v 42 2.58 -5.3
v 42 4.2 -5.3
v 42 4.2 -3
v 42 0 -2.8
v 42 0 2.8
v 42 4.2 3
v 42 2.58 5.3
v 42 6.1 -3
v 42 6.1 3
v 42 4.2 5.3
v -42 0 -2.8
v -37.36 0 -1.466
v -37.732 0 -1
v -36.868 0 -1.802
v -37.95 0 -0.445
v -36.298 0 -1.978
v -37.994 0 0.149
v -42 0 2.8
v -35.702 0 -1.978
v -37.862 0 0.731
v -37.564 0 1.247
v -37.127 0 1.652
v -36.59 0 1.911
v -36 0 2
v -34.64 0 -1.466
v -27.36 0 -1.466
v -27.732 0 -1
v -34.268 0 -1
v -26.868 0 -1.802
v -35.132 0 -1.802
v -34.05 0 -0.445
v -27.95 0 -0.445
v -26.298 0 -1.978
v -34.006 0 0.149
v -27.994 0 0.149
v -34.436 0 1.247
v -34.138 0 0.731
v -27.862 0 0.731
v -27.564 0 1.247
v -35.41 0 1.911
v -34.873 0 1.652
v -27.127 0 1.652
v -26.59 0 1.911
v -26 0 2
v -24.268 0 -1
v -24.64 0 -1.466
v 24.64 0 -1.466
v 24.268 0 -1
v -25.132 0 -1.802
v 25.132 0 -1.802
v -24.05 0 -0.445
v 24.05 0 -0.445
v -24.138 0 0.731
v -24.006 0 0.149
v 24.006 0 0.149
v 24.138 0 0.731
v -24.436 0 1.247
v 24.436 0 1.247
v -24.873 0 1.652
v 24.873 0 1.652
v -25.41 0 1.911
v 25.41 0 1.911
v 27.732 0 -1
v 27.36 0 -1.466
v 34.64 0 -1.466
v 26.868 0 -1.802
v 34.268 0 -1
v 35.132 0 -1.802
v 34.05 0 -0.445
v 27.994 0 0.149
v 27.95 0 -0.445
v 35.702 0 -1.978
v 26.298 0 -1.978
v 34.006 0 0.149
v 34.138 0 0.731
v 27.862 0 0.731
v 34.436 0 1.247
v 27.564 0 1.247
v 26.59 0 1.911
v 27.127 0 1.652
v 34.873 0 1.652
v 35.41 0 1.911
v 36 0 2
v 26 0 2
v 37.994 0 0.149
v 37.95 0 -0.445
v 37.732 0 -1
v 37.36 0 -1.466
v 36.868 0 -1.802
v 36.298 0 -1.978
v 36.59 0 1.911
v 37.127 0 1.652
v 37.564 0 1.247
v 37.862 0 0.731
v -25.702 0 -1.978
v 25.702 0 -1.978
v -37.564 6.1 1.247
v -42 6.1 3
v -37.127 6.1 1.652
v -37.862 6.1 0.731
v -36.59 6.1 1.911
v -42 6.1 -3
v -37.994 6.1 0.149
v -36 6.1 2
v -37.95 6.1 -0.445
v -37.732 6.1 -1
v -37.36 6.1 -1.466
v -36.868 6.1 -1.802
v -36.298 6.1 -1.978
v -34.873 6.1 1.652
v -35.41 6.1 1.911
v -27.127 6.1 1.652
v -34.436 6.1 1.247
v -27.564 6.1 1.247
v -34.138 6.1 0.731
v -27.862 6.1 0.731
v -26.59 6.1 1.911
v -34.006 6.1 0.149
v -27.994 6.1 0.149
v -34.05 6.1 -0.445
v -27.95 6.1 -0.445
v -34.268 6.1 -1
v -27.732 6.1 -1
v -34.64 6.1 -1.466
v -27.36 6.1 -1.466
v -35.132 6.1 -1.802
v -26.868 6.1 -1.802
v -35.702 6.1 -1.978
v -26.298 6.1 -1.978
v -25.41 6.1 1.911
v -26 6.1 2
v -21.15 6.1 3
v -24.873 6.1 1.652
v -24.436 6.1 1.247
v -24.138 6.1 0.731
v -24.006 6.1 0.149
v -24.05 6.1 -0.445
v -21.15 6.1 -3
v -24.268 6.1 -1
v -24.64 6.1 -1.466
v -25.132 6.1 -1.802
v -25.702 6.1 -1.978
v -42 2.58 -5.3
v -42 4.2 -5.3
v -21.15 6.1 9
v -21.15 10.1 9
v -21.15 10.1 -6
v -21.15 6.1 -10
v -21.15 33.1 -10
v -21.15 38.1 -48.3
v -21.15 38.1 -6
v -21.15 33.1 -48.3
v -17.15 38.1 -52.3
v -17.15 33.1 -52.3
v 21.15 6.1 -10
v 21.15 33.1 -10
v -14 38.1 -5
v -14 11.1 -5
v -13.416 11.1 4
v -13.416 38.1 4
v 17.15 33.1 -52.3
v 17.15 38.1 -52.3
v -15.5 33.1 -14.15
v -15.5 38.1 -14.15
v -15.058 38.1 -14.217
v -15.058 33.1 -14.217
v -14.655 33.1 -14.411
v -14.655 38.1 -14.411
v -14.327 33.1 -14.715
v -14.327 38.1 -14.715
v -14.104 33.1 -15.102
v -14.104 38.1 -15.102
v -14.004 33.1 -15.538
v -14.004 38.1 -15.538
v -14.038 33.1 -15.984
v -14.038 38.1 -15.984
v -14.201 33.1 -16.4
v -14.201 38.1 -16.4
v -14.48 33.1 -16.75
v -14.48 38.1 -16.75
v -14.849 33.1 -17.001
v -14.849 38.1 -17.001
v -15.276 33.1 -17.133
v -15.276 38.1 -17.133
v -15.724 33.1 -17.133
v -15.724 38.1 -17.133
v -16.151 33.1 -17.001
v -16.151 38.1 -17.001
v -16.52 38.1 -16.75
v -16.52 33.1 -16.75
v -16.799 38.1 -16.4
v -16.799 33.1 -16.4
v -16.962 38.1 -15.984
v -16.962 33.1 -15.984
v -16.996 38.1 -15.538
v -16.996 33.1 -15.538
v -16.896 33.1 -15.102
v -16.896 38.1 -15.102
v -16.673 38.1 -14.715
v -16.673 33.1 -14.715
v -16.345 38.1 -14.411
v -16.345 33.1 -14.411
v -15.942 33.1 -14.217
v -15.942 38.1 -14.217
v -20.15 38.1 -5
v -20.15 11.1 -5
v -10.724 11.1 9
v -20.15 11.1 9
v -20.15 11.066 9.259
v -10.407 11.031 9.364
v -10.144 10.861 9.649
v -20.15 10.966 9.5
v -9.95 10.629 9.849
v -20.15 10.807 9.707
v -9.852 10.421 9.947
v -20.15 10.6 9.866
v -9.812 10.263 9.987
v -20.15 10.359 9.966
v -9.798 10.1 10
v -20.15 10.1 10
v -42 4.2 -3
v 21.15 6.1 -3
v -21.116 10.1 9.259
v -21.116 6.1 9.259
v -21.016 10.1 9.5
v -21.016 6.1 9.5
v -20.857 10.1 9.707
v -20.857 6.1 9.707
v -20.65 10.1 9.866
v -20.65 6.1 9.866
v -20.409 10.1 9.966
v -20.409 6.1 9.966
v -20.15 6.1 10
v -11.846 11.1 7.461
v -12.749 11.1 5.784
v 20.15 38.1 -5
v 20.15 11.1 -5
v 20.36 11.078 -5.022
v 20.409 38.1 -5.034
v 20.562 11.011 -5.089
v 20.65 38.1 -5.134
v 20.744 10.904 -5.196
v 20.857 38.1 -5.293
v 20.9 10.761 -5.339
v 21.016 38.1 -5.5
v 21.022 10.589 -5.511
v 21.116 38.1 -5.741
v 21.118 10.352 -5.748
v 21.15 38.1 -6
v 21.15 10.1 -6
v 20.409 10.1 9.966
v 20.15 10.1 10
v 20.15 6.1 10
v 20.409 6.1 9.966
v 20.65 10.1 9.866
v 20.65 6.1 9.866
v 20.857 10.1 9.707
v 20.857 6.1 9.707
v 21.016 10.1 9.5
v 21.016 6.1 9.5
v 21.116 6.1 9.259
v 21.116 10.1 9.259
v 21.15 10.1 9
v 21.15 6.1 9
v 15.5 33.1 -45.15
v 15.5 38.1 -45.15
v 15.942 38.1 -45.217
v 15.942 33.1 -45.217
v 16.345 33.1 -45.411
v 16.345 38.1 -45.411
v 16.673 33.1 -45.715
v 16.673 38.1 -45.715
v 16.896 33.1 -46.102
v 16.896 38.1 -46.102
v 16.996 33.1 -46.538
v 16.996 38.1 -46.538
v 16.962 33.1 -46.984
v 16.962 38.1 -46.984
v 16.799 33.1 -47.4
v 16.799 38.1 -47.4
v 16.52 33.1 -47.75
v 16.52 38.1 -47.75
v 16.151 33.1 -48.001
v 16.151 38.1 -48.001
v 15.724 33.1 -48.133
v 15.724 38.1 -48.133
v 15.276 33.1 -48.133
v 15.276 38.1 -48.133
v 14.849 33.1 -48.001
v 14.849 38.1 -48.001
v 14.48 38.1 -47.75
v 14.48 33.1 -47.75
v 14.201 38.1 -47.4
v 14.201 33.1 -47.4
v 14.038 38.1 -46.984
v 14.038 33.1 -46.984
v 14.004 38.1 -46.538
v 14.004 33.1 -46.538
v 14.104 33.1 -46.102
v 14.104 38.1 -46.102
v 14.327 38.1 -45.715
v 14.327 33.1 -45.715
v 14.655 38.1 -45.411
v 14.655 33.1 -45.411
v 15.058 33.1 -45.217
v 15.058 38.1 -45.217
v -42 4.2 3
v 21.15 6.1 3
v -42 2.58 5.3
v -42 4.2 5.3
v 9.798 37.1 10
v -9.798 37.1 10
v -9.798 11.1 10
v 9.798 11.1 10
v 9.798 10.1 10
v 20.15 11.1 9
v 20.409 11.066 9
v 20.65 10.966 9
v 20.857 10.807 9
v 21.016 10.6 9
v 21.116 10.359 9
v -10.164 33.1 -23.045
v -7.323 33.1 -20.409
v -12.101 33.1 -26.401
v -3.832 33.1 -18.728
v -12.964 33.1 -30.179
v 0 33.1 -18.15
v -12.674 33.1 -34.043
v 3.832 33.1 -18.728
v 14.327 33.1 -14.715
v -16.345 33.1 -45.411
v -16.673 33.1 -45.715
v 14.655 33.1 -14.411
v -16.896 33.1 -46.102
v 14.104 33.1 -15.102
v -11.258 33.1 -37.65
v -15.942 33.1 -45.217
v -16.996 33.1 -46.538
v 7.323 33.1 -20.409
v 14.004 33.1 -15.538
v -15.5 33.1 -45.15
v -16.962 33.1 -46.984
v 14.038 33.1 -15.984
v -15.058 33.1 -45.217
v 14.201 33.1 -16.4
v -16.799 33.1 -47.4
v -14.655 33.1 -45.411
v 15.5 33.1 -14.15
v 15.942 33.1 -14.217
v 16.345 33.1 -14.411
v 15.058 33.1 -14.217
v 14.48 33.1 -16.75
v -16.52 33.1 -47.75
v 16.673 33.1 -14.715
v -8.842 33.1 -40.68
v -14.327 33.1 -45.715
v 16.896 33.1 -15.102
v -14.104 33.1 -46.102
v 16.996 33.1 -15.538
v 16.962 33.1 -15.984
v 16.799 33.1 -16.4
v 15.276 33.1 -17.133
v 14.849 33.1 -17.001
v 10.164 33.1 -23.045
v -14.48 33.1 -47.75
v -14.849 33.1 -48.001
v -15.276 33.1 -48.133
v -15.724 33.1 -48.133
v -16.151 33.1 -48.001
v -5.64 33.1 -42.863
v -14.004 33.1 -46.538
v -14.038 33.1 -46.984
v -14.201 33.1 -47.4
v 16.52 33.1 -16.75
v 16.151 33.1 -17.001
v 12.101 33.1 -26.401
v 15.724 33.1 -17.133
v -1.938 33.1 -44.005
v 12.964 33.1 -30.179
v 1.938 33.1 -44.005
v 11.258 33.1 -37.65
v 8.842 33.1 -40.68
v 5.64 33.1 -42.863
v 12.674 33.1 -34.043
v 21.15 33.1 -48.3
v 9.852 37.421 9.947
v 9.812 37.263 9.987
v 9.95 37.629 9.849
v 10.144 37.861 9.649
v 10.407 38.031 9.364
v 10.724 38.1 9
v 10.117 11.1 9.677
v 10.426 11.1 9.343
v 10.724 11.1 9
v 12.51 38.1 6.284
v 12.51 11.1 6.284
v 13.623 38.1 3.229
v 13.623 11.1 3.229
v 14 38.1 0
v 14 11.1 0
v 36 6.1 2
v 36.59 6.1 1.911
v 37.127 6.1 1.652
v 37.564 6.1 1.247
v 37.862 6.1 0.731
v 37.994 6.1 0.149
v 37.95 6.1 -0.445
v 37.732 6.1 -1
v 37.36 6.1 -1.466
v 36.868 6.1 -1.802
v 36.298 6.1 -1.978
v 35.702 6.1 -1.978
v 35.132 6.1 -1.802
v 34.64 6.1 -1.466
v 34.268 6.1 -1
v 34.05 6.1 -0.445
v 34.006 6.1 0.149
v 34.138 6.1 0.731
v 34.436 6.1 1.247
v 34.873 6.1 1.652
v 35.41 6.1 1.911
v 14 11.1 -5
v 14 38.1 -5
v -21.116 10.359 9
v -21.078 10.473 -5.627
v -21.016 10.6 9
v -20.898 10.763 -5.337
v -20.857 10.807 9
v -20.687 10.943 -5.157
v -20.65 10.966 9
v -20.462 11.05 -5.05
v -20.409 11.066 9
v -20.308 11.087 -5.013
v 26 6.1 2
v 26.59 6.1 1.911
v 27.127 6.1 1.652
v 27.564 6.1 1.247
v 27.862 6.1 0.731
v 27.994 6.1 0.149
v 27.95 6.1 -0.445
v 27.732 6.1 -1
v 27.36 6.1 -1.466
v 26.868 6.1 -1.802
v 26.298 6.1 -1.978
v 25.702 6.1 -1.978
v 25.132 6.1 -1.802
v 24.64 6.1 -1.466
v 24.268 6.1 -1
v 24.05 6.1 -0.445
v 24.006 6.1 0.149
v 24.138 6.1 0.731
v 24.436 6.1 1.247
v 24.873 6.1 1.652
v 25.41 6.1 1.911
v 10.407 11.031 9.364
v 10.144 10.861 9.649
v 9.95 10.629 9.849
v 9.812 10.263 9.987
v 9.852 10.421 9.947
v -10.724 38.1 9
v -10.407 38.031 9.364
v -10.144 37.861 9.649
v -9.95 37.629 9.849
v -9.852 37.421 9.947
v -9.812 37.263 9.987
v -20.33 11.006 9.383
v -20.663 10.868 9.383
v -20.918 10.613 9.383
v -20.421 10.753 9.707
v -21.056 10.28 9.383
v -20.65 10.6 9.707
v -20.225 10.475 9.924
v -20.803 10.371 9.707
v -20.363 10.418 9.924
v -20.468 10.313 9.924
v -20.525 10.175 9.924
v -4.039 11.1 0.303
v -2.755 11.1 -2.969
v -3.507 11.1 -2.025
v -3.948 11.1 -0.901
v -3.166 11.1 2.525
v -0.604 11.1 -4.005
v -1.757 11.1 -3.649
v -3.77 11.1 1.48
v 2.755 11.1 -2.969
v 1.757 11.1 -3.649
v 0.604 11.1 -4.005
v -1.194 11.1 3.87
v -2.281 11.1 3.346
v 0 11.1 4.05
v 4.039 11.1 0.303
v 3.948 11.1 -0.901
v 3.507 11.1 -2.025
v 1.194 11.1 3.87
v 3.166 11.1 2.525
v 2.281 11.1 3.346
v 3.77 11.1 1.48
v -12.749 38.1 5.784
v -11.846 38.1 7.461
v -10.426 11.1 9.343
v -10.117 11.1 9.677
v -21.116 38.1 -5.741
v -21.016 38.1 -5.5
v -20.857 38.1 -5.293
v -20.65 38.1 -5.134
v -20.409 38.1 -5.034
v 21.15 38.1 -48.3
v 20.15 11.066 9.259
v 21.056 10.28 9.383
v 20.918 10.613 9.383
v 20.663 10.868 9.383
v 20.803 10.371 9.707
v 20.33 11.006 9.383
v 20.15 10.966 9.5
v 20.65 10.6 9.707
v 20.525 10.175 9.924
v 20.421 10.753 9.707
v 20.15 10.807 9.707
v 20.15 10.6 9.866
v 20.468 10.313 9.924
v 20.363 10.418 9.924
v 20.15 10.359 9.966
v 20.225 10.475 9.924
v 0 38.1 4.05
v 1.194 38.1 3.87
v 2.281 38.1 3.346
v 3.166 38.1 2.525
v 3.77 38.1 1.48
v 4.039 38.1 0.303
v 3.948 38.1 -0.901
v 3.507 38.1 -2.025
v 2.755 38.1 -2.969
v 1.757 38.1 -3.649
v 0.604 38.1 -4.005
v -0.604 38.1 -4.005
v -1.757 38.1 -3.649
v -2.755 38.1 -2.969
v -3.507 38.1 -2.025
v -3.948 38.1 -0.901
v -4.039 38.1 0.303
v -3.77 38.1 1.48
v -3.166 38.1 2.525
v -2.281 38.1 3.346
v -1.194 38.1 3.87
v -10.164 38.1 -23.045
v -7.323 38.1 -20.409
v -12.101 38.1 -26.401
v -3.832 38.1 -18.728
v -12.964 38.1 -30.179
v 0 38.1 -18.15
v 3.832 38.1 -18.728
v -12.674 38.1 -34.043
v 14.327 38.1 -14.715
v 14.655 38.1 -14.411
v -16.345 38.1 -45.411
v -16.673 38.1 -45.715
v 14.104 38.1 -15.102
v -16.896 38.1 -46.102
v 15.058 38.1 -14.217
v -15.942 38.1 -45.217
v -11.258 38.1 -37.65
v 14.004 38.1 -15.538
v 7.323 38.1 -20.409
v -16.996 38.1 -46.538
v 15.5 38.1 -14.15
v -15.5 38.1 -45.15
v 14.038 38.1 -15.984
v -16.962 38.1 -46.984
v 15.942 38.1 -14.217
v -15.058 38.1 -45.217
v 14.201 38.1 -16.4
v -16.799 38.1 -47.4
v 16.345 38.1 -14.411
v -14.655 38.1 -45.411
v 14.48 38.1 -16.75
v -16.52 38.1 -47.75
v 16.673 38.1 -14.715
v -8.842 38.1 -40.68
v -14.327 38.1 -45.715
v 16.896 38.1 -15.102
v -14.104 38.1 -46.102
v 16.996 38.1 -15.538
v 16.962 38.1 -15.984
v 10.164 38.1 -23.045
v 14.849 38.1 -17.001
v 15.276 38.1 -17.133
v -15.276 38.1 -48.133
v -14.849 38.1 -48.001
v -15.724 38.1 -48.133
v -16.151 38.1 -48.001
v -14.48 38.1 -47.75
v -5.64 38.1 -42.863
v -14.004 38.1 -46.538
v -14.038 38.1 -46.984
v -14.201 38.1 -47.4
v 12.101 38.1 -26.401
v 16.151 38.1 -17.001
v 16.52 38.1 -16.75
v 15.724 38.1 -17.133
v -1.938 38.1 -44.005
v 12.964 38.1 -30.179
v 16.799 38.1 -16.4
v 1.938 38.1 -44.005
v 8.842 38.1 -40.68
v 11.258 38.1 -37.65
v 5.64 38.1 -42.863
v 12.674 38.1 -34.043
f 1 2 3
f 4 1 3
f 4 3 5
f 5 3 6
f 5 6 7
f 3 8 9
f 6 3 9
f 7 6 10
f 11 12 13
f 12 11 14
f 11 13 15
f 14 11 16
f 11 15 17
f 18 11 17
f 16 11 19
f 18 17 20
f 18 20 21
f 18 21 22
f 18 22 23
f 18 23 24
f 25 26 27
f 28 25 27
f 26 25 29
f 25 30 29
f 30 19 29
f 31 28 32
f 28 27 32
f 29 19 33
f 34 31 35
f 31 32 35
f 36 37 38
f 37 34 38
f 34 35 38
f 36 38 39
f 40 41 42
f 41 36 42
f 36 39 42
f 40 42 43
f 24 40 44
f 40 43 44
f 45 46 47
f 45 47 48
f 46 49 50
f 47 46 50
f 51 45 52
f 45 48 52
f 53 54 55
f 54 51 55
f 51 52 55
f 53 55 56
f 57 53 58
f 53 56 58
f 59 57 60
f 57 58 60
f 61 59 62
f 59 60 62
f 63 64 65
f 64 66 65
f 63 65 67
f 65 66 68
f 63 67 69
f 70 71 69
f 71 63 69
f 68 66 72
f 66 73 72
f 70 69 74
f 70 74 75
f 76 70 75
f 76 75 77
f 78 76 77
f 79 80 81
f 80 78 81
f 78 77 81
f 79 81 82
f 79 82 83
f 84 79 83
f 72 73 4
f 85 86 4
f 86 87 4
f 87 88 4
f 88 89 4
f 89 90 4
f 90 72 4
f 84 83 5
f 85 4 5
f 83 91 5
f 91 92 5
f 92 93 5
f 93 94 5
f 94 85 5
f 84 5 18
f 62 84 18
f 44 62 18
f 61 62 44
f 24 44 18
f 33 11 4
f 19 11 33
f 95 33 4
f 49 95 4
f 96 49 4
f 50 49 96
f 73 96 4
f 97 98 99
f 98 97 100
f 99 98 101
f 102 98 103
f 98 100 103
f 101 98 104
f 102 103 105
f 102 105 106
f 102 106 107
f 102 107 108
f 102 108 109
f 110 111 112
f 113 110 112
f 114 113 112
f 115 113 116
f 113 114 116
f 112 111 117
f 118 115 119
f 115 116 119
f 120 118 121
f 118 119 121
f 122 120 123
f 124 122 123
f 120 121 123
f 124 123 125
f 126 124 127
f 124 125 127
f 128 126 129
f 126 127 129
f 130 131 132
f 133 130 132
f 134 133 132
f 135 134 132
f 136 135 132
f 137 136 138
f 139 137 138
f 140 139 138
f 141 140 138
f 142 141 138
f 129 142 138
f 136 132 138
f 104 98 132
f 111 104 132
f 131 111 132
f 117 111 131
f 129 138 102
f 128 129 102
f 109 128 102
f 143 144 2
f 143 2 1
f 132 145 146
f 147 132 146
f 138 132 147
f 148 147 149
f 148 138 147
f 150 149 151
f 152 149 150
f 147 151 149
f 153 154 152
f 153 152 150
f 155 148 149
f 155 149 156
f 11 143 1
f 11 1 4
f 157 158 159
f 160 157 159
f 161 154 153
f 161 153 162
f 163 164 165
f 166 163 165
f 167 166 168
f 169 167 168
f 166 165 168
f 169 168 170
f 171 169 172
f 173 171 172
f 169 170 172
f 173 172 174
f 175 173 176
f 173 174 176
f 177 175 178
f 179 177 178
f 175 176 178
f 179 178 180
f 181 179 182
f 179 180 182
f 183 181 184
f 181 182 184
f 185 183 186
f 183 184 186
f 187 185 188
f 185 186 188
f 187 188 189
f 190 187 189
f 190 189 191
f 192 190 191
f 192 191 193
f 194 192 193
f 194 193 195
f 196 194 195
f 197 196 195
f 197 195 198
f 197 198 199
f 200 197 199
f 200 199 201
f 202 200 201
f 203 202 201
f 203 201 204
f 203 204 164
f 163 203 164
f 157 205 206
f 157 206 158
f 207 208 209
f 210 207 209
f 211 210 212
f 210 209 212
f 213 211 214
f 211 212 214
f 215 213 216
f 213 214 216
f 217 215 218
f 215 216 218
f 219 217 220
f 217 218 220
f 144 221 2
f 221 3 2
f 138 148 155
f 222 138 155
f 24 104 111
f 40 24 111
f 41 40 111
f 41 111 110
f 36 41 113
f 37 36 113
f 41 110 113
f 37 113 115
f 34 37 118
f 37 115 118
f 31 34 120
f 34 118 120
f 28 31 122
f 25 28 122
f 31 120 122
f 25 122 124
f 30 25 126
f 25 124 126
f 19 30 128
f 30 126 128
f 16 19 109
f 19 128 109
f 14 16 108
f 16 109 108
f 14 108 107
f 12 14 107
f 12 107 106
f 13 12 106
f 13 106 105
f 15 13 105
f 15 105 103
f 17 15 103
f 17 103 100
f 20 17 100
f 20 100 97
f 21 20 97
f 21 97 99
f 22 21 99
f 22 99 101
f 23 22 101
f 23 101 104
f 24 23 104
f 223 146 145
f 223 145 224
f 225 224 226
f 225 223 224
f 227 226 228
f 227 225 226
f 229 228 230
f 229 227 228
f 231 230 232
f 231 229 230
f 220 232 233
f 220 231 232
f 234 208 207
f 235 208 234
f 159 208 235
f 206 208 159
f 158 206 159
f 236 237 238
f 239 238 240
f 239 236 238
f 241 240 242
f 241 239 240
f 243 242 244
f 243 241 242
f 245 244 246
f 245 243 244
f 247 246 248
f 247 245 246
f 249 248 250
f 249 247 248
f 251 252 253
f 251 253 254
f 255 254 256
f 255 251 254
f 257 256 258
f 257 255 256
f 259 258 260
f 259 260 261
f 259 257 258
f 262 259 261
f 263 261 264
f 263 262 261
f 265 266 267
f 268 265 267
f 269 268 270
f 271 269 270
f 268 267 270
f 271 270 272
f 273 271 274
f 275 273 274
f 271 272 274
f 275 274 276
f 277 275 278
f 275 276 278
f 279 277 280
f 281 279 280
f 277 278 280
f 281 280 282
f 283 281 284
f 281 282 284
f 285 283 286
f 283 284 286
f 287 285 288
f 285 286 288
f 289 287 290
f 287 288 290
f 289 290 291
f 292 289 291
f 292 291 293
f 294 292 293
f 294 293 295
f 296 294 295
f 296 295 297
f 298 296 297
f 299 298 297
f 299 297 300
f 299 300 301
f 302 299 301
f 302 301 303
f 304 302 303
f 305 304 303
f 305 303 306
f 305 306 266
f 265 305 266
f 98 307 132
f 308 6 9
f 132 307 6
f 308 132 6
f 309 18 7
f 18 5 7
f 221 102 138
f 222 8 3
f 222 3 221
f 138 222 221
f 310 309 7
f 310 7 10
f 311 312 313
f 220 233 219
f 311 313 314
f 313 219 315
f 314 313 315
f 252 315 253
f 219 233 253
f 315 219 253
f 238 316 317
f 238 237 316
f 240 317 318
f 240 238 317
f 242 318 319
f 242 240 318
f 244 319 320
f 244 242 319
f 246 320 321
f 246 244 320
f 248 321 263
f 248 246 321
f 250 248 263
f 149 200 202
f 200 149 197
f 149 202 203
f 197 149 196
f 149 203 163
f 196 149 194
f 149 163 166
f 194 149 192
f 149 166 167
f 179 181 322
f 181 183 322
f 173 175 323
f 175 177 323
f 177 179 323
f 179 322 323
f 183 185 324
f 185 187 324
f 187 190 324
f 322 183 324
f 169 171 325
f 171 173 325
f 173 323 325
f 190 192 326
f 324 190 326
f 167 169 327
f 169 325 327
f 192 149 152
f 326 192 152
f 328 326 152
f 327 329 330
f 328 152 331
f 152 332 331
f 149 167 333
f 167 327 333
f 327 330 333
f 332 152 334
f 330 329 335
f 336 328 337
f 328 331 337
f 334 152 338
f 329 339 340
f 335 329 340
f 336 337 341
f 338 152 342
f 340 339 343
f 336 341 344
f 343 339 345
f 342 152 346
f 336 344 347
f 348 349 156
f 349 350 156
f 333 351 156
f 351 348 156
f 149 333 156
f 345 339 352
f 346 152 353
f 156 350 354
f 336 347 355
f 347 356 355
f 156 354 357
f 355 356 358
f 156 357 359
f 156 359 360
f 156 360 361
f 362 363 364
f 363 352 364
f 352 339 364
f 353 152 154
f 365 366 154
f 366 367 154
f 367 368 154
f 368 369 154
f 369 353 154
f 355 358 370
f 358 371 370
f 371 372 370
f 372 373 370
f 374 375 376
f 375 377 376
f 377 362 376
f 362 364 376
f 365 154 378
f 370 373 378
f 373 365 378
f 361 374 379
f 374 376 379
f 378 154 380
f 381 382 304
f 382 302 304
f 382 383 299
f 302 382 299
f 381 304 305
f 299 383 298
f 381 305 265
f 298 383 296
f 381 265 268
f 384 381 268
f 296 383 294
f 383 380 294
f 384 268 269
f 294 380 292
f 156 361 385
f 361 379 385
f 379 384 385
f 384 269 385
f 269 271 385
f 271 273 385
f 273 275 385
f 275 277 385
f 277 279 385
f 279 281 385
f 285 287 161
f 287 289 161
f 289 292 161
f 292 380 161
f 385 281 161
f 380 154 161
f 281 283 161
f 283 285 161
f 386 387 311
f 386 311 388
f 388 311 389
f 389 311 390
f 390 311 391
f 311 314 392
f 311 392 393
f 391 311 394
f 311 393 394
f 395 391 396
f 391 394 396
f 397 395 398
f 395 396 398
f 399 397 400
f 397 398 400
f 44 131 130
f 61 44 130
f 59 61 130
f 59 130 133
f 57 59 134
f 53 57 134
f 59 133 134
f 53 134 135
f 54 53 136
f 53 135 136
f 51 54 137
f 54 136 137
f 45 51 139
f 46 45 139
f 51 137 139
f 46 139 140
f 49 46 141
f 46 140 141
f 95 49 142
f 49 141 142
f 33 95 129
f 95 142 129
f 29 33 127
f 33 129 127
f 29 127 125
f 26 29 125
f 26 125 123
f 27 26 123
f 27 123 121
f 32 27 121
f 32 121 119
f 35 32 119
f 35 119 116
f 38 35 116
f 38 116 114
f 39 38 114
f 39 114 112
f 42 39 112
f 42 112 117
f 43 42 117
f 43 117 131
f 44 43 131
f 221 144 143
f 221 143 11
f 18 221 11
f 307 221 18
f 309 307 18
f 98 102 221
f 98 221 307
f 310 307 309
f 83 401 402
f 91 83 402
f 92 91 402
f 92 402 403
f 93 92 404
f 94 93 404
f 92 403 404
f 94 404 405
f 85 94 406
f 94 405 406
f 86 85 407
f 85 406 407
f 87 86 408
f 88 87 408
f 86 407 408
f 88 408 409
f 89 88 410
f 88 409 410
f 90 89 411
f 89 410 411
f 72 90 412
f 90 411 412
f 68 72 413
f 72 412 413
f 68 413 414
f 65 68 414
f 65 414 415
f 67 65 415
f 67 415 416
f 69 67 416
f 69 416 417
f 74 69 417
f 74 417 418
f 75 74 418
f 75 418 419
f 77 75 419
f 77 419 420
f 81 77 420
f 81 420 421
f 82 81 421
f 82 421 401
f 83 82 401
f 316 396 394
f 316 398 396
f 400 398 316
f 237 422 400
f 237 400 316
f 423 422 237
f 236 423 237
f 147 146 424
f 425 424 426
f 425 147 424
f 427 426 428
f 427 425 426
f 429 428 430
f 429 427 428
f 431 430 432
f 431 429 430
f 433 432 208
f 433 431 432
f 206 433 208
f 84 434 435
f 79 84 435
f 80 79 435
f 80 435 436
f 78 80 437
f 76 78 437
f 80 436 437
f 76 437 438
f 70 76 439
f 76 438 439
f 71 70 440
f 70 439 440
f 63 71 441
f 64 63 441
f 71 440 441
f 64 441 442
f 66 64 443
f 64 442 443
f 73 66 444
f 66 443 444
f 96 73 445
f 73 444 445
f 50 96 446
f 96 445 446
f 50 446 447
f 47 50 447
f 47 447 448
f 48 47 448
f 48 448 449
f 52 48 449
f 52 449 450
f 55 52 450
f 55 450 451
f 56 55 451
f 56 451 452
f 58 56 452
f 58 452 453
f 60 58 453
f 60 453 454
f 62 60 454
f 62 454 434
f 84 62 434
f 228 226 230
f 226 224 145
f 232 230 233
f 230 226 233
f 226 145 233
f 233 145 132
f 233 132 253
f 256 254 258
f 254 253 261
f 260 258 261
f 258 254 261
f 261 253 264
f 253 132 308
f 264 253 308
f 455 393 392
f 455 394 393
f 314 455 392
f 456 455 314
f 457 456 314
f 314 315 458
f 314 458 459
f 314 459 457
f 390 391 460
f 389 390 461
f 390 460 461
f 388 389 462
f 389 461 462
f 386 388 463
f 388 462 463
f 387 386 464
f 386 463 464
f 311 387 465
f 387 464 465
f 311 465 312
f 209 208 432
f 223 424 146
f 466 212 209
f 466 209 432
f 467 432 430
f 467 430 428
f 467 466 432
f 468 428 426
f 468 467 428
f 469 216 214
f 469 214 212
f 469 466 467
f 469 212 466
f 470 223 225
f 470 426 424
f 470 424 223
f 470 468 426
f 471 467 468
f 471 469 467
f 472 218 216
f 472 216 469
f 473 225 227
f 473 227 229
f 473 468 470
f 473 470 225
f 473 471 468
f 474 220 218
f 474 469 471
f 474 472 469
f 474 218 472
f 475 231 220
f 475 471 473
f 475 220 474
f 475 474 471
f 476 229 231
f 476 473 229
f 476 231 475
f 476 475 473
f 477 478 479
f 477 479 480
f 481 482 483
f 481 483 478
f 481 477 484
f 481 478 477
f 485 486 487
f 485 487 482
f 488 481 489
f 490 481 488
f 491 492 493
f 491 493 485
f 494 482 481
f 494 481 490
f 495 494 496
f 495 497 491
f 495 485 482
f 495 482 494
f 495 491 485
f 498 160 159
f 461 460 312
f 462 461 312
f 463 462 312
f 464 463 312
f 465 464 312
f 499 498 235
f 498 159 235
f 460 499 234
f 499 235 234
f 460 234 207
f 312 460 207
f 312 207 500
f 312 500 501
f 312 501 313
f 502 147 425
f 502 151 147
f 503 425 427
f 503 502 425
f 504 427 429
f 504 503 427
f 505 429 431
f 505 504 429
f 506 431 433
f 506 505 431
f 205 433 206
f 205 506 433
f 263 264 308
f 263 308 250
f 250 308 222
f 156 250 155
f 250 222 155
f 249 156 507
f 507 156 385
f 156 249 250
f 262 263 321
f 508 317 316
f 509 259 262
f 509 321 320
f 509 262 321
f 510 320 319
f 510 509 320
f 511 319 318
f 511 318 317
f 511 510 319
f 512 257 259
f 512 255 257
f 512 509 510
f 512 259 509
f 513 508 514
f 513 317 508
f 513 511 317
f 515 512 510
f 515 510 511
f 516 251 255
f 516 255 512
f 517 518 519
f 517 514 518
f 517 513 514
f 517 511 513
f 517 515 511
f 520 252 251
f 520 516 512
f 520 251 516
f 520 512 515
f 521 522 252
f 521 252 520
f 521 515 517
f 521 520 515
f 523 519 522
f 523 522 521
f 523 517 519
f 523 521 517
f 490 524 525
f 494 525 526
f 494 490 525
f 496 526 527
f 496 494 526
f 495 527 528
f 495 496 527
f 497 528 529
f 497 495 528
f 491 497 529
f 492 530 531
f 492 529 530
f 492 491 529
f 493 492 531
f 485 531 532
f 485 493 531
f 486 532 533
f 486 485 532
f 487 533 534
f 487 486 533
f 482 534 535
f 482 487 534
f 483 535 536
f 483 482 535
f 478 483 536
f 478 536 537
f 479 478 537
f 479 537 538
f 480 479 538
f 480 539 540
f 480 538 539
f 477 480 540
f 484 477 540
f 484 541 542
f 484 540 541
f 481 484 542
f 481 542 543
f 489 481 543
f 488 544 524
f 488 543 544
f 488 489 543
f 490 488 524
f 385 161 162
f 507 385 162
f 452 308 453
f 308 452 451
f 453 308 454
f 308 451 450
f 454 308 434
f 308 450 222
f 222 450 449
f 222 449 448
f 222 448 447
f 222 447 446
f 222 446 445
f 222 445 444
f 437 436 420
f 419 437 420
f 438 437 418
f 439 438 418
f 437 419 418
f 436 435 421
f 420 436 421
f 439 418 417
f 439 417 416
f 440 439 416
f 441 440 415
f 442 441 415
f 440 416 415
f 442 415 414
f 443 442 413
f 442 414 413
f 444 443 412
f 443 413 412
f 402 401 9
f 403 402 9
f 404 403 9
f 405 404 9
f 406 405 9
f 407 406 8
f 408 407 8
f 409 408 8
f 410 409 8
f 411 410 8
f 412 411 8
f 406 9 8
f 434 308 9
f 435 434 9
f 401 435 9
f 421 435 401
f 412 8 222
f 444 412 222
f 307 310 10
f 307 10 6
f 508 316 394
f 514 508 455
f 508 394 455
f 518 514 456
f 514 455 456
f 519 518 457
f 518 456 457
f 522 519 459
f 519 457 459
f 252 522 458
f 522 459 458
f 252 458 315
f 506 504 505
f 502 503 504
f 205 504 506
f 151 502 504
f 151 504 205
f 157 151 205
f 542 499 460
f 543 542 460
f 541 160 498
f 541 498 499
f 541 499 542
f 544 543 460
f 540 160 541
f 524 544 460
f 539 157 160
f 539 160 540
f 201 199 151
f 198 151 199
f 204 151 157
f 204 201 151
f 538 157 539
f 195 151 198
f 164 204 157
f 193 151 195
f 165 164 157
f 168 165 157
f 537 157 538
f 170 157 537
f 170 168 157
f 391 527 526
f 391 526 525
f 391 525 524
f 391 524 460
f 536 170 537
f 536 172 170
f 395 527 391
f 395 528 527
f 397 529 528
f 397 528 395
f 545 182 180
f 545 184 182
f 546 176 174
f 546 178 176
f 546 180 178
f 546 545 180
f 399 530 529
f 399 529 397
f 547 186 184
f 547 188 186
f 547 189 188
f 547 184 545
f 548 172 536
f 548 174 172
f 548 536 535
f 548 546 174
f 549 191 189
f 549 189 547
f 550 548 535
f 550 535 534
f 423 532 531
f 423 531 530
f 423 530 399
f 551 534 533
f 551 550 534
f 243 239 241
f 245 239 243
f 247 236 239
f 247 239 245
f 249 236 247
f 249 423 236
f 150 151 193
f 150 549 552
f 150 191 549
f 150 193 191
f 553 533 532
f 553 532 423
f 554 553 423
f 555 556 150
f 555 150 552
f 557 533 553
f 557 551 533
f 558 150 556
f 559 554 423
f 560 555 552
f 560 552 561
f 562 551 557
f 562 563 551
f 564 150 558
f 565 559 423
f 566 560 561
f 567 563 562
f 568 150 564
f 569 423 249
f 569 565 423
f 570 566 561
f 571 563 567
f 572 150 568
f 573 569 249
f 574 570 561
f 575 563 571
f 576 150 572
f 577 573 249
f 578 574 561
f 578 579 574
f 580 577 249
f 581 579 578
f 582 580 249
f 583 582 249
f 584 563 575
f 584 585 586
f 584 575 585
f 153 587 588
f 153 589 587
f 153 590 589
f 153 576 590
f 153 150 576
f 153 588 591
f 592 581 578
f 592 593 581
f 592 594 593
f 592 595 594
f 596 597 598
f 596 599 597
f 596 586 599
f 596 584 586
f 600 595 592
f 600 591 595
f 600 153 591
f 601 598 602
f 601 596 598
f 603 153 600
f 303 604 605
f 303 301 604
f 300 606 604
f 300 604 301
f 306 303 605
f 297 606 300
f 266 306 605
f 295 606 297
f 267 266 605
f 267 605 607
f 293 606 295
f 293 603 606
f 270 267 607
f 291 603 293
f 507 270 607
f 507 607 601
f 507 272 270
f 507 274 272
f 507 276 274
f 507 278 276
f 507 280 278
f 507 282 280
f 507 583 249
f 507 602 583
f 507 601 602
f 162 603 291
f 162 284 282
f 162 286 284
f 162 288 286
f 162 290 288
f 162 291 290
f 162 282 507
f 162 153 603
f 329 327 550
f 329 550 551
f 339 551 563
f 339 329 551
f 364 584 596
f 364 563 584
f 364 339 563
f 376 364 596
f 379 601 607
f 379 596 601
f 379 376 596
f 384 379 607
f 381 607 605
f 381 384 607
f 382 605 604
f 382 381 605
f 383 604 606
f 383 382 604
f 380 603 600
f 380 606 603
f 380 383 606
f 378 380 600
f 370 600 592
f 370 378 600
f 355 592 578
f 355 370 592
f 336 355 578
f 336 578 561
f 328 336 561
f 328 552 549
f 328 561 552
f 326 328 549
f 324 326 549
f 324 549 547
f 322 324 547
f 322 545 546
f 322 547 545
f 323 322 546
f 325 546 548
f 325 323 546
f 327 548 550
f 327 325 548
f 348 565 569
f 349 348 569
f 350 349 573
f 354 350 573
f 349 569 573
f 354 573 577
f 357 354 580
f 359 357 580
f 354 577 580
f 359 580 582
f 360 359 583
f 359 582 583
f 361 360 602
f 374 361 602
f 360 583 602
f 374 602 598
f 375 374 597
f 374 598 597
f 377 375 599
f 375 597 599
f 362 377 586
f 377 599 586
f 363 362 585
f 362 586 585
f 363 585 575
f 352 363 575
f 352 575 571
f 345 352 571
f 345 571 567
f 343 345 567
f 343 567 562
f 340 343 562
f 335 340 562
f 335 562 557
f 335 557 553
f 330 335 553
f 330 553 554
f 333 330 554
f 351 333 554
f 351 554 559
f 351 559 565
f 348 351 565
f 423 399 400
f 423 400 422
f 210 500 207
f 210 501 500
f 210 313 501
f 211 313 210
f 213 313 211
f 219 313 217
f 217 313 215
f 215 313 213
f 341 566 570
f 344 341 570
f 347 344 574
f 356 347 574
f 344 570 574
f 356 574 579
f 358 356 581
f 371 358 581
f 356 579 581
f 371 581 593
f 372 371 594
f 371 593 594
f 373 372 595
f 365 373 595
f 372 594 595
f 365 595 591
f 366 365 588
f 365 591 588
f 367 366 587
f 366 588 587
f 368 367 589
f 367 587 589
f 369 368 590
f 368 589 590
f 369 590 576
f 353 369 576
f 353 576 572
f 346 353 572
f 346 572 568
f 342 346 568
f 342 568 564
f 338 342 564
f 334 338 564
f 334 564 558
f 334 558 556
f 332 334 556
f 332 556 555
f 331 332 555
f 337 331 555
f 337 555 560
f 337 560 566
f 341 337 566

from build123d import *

# Parameters (mm, degrees)
BOSS_EXTRUDE1_DEPTH     = 42
SKETCH2_W               = 42.3
SKETCH2_H               = 20
BOSS_EXTRUDE2_DEPTH     = 32
SKETCH3_W               = 42.3
SKETCH3_H               = 42.3
BOSS_EXTRUDE3_DEPTH     = 5
SHELL2_START            = 11.1
SHELL2_OUTLINE_W        = 42.3
SHELL2_OUTLINE_H        = 15
SHELL2_DEPTH            = 27
CHAMFER2_SIZE           = 4
CUT_EXTRUDE1_DEPTH      = 75.799064165
CUT_EXTRUDE1_DEPTH_BACK = 75.799064165
SKETCH4_R               = 13
FILLET1_R               = 1
BOSS_EXTRUDE4_DEPTH     = 27
SKETCH18_R              = 4.05
CUT_EXTRUDE2_DEPTH      = 73.306915299
FILLET8_R               = 1
SKETCH19_R              = 1.5
CUT_EXTRUDE3_DEPTH      = 78.142076716
SKETCH20_R              = 2
CUT_EXTRUDE4_DEPTH      = 75.318840185


# Read off the part's stored shape, not the designer's step: Shell2
with BuildPart() as part:
    # Sketch1 → Boss-Extrude1 (new, symmetric)
    with BuildSketch(Plane(origin=(0, 0, 0), x_dir=(0, 0, -1), z_dir=(1, 0, 0))):
        Polygon((-3, 6.1), (3, 6.1), (3, 4.2), (5.3, 4.2), (5.3, 2.58), (2.8, 0), (-2.8, 0), (-5.3, 2.58), (-5.3, 4.2), (-3, 4.2), align=None)
    extrude(amount=BOSS_EXTRUDE1_DEPTH, both=True)

    # Sketch2 → Boss-Extrude2 (add)
    with BuildSketch(Plane(origin=(0, 6.1, 0), x_dir=(1, 0, 0), z_dir=(0, 1, 0))):
        Rectangle(SKETCH2_W, SKETCH2_H)
    extrude(amount=BOSS_EXTRUDE2_DEPTH)

    # Sketch3 → Boss-Extrude3 (add)
    with BuildSketch(Plane(origin=(0, 33.1, 0), x_dir=(1, 0, 0), z_dir=(0, 1, 0))):
        with Locations((0, 31.15)):
            Rectangle(SKETCH3_W, SKETCH3_H)
    extrude(amount=BOSS_EXTRUDE3_DEPTH)

    # Shell2 outline → Shell2 (cut)
    with BuildSketch(Plane(origin=(0, 0, 0), x_dir=(1, 0, 0), z_dir=(0, 1, 0)).offset(SHELL2_START)):
        with Locations((0, -2.5)):
            Rectangle(SHELL2_OUTLINE_W, SHELL2_OUTLINE_H)
    extrude(amount=SHELL2_DEPTH, mode=Mode.SUBTRACT)

    # Chamfer2
    chamfer2_edges = [part.edges().sort_by_distance(p)[0] for p in [
        (21.15, 35.6, -52.3),
        (-21.15, 35.6, -52.3),
    ]]
    chamfer(chamfer2_edges, length=CHAMFER2_SIZE)

    # Sketch4 → Cut-Extrude1 (cut, two sides: drawn at the far end of the back side and taken through both)
    with BuildSketch(Plane(origin=(0, 33.1, 0), x_dir=(1, 0, 0), z_dir=(0, 1, 0)).offset(-CUT_EXTRUDE1_DEPTH_BACK)):
        with Locations(Location((0, 31.15, 0), (0, 0, 270))):
            Circle(SKETCH4_R)
    extrude(amount=CUT_EXTRUDE1_DEPTH + CUT_EXTRUDE1_DEPTH_BACK, mode=Mode.SUBTRACT)

    # Fillet1
    fillet1_edges = [part.edges().sort_by_distance(p)[0] for p in [
        (-21.15, 8.6, 10),
        (21.15, 8.6, 10),
        (-21.15, 11.1, 2.5),
        (-21.15, 24.6, -5),
        (21.15, 11.1, 2.5),
        (21.15, 24.6, -5),
    ]]
    fillet(fillet1_edges, radius=FILLET1_R)

    # Sketch17 → Boss-Extrude4 (add)
    with BuildSketch(Plane(origin=(0, 11.1, 0), x_dir=(1, 0, 0), z_dir=(0, 1, 0))):
        with BuildLine():
            Line((14, 5), (-14, 5))
            Line((-14, 5), (-13.416407865, -4))
            ThreePointArc((-13.416407865, -4), (-11.98860738, -7.230027185), (-9.797958971, -10))
            Line((-9.797958971, -10), (9.797958971, -10))
            ThreePointArc((9.797958971, -10), (12.906808777, -5.423494003), (14, 0))
            Line((14, 0), (14, 5))
        make_face()
    extrude(amount=BOSS_EXTRUDE4_DEPTH)

    # Sketch18 → Cut-Extrude2 (cut, through all)
    with BuildSketch(Plane(origin=(0, 11.1, 0), x_dir=(1, 0, 0), z_dir=(0, 1, 0))):
        with Locations(Location((0, 0, 0), (0, 0, 270))):
            Circle(SKETCH18_R)
    extrude(amount=CUT_EXTRUDE2_DEPTH, mode=Mode.SUBTRACT)

    # Fillet8
    # the kernel refuses this fillet: 1 mm, written as the material it takes off along each edge
    with BuildSketch(Plane(origin=(-20.15, 10.1, 9), x_dir=(0, 1, 0), z_dir=(0, 0, 1))) as fillet8_piece_1_section:
        Polygon((0, 0), (FILLET8_R, 0), (FILLET8_R, FILLET8_R), (0, FILLET8_R), align=None)
    fillet8_piece_1 = extrude(amount=FILLET8_R, mode=Mode.PRIVATE)
    fillet8_piece_1 = fillet8_piece_1 - Plane(origin=(-20.15, 10.1, 9), x_dir=(0.7071067811865475, -0.7071067811865475, 0), z_dir=(0, 0, 1)) * Sphere(FILLET8_R, mode=Mode.PRIVATE)
    add(fillet8_piece_1, mode=Mode.SUBTRACT)
    with BuildSketch(Plane(origin=(20.15, 10.1, 9), x_dir=(0, 1, 0), z_dir=(0, 0, 1))) as fillet8_piece_2_section:
        Polygon((0, 0), (FILLET8_R, 0), (FILLET8_R, -FILLET8_R), (0, -FILLET8_R), align=None)
    fillet8_piece_2 = extrude(amount=FILLET8_R, mode=Mode.PRIVATE)
    fillet8_piece_2 = fillet8_piece_2 - Plane(origin=(20.15, 10.1, 9), x_dir=(-0.7071067811865475, -0.7071067811865475, 0), z_dir=(0, 0, 1)) * Sphere(FILLET8_R, mode=Mode.PRIVATE)
    add(fillet8_piece_2, mode=Mode.SUBTRACT)
    with BuildSketch(Plane(origin=(7.297958971, 11.1, 10), x_dir=(0, -1, 0), z_dir=(1, 0, 0))) as fillet8_piece_3_section:
        with BuildLine():
            CenterArc((FILLET8_R, FILLET8_R), FILLET8_R, 180, 90)
            Line((0, FILLET8_R), (0, 0))
            Line((0, 0), (FILLET8_R, 0))
        make_face()
    fillet8_piece_3 = extrude(amount=12.852041029, mode=Mode.PRIVATE)
    fillet8_piece_3 = fillet8_piece_3 - Plane(origin=(0, 10.87099501, 0), x_dir=(0.6998542122237654, 0, 0.7142857142857142), z_dir=(0, -1, 0)) * Cylinder(14, 30, mode=Mode.PRIVATE)
    add(fillet8_piece_3, mode=Mode.SUBTRACT)
    with BuildSketch(Plane(origin=(-12.297958971, 38.1, 10), x_dir=(0, 0, -1), z_dir=(1, 0, 0))) as fillet8_piece_4:
        with BuildLine():
            CenterArc((FILLET8_R, -FILLET8_R), FILLET8_R, 90, 90)
            Line((0, -FILLET8_R), (0, 0))
            Line((0, 0), (FILLET8_R, 0))
        make_face()
    extrude(amount=24.595917942, mode=Mode.SUBTRACT)
    with BuildSketch(Plane(origin=(-20.15, 11.1, 10), x_dir=(0, -1, 0), z_dir=(1, 0, 0))) as fillet8_piece_5_section:
        with BuildLine():
            CenterArc((FILLET8_R, FILLET8_R), FILLET8_R, 180, 90)
            Line((0, FILLET8_R), (0, 0))
            Line((0, 0), (FILLET8_R, 0))
        make_face()
    fillet8_piece_5 = extrude(amount=12.852041029, mode=Mode.PRIVATE)
    fillet8_piece_5 = fillet8_piece_5 - Plane(origin=(0, 10.870994427, 0), x_dir=(-0.9583148474999099, 0, 0.28571428571428575), z_dir=(0, -1, 0)) * Cylinder(14, 30, mode=Mode.PRIVATE)
    add(fillet8_piece_5, mode=Mode.SUBTRACT)

    # Sketch19 → Cut-Extrude3 (cut, through all)
    with BuildSketch(Plane(origin=(0, 38.1, 0), x_dir=(1, 0, 0), z_dir=(0, 1, 0))):
        with Locations(Location((-15.5, 46.65, 0), (0, 0, 270))):
            Circle(SKETCH19_R)
        with Locations(Location((15.5, 46.65, 0), (0, 0, 270))):
            Circle(SKETCH19_R)
        with Locations(Location((15.5, 15.65, 0), (0, 0, 270))):
            Circle(SKETCH19_R)
        with Locations(Location((-15.5, 15.65, 0), (0, 0, 270))):
            Circle(SKETCH19_R)
    extrude(amount=-CUT_EXTRUDE3_DEPTH, mode=Mode.SUBTRACT)

    # Sketch20 → Cut-Extrude4 (cut, through all)
    with BuildSketch(Plane(origin=(0, 6.1, 0), x_dir=(1, 0, 0), z_dir=(0, 1, 0))):
        with Locations(Location((36, 0, 0), (0, 0, 270))):
            Circle(SKETCH20_R)
        with Locations(Location((26, 0, 0), (0, 0, 270))):
            Circle(SKETCH20_R)
        with Locations(Location((-26, 0, 0), (0, 0, 270))):
            Circle(SKETCH20_R)
        with Locations(Location((-36, 0, 0), (0, 0, 270))):
            Circle(SKETCH20_R)
    extrude(amount=-CUT_EXTRUDE4_DEPTH, mode=Mode.SUBTRACT)


solid = part.part
